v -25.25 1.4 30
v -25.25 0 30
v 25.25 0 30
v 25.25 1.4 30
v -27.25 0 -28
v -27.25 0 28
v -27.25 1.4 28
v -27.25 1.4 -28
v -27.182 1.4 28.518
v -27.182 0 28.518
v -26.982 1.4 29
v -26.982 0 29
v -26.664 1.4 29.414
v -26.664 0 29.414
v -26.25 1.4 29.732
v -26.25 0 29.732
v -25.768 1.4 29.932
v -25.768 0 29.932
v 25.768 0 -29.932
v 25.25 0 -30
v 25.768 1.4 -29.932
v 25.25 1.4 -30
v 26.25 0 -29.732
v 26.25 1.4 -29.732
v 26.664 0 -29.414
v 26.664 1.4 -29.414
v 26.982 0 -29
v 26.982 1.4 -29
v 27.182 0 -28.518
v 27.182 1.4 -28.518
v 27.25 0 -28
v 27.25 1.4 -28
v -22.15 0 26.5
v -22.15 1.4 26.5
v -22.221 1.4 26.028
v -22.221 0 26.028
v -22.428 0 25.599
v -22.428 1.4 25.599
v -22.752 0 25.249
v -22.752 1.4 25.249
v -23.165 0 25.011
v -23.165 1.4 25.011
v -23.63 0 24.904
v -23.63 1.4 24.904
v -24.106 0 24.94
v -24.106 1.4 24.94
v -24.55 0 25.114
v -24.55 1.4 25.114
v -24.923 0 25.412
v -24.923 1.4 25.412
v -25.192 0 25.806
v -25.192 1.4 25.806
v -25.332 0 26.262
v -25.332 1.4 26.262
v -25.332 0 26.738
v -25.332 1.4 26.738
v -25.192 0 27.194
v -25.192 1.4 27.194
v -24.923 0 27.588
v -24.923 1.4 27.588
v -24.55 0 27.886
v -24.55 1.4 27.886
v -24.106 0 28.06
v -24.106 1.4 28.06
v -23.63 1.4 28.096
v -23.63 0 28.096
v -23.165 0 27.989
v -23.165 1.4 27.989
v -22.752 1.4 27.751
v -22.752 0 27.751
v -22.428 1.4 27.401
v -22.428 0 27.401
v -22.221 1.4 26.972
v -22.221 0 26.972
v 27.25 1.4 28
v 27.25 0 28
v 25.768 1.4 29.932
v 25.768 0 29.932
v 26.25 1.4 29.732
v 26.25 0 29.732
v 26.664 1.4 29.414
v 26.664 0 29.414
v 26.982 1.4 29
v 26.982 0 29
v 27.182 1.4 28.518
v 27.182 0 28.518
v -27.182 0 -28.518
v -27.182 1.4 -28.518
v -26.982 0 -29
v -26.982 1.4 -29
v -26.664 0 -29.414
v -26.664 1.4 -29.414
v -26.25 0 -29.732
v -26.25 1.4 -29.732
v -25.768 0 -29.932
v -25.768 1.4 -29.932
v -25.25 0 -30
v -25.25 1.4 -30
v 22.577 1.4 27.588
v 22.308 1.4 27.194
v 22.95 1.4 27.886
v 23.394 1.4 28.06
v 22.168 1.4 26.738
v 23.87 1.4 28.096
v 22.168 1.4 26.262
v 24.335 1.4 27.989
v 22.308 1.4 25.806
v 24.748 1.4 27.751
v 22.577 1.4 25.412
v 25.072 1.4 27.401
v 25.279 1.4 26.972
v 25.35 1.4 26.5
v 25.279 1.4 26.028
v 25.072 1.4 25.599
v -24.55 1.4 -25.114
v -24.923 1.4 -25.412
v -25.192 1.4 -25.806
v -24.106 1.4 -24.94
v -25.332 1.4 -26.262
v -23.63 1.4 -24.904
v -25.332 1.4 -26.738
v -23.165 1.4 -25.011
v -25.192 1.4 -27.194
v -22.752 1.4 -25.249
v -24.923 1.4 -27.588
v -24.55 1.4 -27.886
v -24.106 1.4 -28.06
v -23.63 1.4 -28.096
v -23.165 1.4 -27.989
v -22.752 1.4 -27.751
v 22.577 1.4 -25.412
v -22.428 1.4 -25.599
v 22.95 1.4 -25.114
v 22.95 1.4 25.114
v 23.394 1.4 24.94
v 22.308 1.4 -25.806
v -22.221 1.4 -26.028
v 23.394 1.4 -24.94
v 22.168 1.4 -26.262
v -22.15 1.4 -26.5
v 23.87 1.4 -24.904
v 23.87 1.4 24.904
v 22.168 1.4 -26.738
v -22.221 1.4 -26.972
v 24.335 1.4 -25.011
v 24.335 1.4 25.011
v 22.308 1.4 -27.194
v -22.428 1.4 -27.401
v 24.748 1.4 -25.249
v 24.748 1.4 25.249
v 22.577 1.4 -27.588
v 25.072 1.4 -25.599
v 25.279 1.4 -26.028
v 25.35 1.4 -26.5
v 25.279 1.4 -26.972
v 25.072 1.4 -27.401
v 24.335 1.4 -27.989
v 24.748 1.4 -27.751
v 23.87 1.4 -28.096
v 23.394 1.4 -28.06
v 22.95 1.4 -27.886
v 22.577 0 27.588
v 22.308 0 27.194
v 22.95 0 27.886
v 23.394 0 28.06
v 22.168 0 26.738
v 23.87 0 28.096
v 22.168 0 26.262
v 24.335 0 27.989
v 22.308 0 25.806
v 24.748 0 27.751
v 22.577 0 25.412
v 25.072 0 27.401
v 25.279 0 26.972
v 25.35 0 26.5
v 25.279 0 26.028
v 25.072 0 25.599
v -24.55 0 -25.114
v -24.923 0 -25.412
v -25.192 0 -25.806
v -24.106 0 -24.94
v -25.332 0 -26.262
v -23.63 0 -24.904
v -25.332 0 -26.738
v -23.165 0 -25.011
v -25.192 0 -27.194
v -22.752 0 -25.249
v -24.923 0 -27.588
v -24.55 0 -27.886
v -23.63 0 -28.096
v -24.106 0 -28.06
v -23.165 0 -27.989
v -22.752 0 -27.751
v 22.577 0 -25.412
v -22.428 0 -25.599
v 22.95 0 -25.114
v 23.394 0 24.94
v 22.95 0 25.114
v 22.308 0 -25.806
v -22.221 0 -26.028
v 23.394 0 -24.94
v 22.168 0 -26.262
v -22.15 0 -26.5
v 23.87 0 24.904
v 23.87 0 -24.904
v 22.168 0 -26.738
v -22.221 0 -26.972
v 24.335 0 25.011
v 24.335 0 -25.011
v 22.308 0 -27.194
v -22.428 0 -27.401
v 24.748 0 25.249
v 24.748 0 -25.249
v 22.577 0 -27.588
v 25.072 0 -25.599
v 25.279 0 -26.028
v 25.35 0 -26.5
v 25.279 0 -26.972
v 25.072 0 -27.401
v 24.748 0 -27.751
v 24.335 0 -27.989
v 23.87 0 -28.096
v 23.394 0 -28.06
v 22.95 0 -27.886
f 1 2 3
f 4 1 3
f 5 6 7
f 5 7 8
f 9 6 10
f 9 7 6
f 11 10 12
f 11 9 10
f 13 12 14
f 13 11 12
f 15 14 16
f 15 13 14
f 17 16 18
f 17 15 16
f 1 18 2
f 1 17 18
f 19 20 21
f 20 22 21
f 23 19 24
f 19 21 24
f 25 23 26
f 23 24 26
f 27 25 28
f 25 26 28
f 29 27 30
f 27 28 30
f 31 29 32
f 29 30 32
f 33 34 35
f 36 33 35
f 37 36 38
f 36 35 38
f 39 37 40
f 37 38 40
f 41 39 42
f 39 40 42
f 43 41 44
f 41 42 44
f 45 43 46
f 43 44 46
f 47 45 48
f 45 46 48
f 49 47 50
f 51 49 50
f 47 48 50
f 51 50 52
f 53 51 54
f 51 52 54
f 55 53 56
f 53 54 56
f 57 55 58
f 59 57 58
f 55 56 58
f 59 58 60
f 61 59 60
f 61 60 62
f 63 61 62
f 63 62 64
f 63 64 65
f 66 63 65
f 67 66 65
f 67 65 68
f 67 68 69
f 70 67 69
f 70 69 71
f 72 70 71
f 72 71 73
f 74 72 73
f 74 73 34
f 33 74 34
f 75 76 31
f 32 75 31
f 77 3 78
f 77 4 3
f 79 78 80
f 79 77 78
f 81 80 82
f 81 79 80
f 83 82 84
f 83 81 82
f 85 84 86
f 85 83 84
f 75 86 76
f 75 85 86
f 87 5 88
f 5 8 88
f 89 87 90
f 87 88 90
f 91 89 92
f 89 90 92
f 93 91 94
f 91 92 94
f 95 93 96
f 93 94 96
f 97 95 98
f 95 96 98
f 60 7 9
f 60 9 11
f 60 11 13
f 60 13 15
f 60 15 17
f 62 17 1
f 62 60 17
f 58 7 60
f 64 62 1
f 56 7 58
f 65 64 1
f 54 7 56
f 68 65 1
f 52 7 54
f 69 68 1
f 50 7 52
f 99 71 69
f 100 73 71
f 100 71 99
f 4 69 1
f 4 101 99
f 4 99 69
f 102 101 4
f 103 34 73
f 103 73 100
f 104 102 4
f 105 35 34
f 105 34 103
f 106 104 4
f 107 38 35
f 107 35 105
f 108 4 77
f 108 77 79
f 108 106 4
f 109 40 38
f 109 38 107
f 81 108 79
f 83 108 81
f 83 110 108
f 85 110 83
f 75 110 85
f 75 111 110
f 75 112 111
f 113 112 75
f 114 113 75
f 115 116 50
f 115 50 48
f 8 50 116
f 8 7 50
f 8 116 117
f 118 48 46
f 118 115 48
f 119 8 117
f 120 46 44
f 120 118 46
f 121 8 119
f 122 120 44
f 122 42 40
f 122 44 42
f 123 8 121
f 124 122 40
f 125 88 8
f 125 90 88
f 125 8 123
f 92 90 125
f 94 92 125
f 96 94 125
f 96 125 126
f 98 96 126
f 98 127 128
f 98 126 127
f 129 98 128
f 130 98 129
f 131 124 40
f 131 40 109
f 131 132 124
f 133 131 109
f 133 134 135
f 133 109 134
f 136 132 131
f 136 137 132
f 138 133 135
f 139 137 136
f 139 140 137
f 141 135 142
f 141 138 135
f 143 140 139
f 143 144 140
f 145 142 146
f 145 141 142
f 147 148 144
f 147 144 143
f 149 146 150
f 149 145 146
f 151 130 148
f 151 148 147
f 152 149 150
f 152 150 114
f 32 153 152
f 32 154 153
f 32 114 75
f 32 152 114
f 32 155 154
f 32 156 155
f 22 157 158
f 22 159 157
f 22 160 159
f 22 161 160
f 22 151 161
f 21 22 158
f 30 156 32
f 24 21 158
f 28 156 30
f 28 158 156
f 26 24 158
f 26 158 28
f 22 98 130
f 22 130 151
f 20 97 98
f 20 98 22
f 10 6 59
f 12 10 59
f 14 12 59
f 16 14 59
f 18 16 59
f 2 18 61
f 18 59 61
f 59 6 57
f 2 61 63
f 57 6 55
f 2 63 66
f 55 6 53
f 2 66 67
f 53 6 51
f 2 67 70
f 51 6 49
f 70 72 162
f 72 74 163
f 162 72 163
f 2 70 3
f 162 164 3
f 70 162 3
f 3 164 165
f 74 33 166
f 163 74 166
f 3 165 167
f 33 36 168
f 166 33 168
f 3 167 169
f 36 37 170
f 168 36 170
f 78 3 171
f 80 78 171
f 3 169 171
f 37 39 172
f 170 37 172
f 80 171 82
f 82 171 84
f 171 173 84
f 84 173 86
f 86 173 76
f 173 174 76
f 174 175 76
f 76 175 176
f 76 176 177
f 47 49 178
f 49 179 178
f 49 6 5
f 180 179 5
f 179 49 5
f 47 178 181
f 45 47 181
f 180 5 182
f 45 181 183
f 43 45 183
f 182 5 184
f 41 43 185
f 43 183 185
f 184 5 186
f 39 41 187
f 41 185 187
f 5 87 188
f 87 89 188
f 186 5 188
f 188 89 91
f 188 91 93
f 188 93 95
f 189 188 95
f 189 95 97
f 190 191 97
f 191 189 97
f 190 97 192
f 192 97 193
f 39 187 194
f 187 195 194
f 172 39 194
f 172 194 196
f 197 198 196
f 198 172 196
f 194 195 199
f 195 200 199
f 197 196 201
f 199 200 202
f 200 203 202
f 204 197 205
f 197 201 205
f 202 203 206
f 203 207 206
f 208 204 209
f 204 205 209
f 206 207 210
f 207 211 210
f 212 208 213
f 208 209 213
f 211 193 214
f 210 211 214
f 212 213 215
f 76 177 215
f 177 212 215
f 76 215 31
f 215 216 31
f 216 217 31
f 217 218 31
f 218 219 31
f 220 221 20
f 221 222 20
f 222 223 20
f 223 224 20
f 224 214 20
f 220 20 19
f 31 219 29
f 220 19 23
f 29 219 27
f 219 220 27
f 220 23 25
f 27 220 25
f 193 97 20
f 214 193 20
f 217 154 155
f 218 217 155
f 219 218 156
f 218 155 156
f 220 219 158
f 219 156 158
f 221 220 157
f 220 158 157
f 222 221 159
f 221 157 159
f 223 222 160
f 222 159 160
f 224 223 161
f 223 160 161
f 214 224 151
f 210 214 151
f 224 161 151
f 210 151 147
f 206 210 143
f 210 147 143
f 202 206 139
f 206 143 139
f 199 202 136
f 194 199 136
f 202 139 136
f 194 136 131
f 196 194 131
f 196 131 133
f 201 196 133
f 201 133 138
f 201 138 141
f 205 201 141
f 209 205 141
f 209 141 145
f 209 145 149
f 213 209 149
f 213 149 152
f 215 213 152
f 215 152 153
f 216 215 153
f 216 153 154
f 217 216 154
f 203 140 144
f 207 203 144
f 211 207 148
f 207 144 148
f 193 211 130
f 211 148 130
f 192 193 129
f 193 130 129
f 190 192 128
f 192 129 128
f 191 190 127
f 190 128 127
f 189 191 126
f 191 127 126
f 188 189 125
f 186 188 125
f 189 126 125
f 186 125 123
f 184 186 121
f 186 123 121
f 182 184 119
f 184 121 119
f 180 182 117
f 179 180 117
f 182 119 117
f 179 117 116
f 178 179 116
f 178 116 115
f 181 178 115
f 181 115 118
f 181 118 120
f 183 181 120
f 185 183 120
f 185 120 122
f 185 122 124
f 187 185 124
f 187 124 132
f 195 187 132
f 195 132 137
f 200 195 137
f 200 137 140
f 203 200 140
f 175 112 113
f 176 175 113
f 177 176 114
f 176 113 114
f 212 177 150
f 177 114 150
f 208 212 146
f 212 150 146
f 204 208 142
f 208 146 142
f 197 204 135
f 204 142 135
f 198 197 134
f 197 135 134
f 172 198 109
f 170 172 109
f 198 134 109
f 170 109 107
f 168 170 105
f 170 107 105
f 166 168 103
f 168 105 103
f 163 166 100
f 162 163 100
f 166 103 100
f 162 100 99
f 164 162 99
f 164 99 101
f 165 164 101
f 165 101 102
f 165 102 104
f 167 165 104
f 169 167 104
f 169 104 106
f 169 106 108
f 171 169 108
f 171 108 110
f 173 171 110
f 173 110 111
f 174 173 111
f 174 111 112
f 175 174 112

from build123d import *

# Parameters (mm, degrees)
SKETCH1_W           = 54.5
SKETCH1_H           = 60
BOSS_EXTRUDE1_DEPTH = 1.4
SKETCH2_R           = 1.6
CUT_EXTRUDE1_DEPTH  = 2.4
FILLET1_R           = 2


with BuildPart() as part:
    # Sketch1 → Boss-Extrude1 (new body)
    with BuildSketch(Plane(origin=(0, 0, 0), x_dir=(1, 0, 0), z_dir=(0, 1, 0))):
        Rectangle(SKETCH1_W, SKETCH1_H)
    extrude(amount=BOSS_EXTRUDE1_DEPTH)

    # Sketch2 → Cut-Extrude1 (cut, through all)
    with BuildSketch(Plane(origin=(0, 1.4, 0), x_dir=(1, 0, 0), z_dir=(0, 1, 0))):
        with Locations((-23.75, 26.5)):
            Circle(SKETCH2_R)
        with Locations((-23.75, -26.5)):
            Circle(SKETCH2_R)
        with Locations((23.75, -26.5)):
            Circle(SKETCH2_R)
        with Locations((23.75, 26.5)):
            Circle(SKETCH2_R)
    extrude(amount=-CUT_EXTRUDE1_DEPTH, mode=Mode.SUBTRACT)

    # Fillet1
    fillet1_edges = [part.edges().sort_by_distance(p)[0] for p in [
        (-27.25, 0.7, -30),
        (27.25, 0.7, -30),
        (27.25, 0.7, 30),
        (-27.25, 0.7, 30),
    ]]
    fillet(fillet1_edges, radius=FILLET1_R)


solid = part.part
